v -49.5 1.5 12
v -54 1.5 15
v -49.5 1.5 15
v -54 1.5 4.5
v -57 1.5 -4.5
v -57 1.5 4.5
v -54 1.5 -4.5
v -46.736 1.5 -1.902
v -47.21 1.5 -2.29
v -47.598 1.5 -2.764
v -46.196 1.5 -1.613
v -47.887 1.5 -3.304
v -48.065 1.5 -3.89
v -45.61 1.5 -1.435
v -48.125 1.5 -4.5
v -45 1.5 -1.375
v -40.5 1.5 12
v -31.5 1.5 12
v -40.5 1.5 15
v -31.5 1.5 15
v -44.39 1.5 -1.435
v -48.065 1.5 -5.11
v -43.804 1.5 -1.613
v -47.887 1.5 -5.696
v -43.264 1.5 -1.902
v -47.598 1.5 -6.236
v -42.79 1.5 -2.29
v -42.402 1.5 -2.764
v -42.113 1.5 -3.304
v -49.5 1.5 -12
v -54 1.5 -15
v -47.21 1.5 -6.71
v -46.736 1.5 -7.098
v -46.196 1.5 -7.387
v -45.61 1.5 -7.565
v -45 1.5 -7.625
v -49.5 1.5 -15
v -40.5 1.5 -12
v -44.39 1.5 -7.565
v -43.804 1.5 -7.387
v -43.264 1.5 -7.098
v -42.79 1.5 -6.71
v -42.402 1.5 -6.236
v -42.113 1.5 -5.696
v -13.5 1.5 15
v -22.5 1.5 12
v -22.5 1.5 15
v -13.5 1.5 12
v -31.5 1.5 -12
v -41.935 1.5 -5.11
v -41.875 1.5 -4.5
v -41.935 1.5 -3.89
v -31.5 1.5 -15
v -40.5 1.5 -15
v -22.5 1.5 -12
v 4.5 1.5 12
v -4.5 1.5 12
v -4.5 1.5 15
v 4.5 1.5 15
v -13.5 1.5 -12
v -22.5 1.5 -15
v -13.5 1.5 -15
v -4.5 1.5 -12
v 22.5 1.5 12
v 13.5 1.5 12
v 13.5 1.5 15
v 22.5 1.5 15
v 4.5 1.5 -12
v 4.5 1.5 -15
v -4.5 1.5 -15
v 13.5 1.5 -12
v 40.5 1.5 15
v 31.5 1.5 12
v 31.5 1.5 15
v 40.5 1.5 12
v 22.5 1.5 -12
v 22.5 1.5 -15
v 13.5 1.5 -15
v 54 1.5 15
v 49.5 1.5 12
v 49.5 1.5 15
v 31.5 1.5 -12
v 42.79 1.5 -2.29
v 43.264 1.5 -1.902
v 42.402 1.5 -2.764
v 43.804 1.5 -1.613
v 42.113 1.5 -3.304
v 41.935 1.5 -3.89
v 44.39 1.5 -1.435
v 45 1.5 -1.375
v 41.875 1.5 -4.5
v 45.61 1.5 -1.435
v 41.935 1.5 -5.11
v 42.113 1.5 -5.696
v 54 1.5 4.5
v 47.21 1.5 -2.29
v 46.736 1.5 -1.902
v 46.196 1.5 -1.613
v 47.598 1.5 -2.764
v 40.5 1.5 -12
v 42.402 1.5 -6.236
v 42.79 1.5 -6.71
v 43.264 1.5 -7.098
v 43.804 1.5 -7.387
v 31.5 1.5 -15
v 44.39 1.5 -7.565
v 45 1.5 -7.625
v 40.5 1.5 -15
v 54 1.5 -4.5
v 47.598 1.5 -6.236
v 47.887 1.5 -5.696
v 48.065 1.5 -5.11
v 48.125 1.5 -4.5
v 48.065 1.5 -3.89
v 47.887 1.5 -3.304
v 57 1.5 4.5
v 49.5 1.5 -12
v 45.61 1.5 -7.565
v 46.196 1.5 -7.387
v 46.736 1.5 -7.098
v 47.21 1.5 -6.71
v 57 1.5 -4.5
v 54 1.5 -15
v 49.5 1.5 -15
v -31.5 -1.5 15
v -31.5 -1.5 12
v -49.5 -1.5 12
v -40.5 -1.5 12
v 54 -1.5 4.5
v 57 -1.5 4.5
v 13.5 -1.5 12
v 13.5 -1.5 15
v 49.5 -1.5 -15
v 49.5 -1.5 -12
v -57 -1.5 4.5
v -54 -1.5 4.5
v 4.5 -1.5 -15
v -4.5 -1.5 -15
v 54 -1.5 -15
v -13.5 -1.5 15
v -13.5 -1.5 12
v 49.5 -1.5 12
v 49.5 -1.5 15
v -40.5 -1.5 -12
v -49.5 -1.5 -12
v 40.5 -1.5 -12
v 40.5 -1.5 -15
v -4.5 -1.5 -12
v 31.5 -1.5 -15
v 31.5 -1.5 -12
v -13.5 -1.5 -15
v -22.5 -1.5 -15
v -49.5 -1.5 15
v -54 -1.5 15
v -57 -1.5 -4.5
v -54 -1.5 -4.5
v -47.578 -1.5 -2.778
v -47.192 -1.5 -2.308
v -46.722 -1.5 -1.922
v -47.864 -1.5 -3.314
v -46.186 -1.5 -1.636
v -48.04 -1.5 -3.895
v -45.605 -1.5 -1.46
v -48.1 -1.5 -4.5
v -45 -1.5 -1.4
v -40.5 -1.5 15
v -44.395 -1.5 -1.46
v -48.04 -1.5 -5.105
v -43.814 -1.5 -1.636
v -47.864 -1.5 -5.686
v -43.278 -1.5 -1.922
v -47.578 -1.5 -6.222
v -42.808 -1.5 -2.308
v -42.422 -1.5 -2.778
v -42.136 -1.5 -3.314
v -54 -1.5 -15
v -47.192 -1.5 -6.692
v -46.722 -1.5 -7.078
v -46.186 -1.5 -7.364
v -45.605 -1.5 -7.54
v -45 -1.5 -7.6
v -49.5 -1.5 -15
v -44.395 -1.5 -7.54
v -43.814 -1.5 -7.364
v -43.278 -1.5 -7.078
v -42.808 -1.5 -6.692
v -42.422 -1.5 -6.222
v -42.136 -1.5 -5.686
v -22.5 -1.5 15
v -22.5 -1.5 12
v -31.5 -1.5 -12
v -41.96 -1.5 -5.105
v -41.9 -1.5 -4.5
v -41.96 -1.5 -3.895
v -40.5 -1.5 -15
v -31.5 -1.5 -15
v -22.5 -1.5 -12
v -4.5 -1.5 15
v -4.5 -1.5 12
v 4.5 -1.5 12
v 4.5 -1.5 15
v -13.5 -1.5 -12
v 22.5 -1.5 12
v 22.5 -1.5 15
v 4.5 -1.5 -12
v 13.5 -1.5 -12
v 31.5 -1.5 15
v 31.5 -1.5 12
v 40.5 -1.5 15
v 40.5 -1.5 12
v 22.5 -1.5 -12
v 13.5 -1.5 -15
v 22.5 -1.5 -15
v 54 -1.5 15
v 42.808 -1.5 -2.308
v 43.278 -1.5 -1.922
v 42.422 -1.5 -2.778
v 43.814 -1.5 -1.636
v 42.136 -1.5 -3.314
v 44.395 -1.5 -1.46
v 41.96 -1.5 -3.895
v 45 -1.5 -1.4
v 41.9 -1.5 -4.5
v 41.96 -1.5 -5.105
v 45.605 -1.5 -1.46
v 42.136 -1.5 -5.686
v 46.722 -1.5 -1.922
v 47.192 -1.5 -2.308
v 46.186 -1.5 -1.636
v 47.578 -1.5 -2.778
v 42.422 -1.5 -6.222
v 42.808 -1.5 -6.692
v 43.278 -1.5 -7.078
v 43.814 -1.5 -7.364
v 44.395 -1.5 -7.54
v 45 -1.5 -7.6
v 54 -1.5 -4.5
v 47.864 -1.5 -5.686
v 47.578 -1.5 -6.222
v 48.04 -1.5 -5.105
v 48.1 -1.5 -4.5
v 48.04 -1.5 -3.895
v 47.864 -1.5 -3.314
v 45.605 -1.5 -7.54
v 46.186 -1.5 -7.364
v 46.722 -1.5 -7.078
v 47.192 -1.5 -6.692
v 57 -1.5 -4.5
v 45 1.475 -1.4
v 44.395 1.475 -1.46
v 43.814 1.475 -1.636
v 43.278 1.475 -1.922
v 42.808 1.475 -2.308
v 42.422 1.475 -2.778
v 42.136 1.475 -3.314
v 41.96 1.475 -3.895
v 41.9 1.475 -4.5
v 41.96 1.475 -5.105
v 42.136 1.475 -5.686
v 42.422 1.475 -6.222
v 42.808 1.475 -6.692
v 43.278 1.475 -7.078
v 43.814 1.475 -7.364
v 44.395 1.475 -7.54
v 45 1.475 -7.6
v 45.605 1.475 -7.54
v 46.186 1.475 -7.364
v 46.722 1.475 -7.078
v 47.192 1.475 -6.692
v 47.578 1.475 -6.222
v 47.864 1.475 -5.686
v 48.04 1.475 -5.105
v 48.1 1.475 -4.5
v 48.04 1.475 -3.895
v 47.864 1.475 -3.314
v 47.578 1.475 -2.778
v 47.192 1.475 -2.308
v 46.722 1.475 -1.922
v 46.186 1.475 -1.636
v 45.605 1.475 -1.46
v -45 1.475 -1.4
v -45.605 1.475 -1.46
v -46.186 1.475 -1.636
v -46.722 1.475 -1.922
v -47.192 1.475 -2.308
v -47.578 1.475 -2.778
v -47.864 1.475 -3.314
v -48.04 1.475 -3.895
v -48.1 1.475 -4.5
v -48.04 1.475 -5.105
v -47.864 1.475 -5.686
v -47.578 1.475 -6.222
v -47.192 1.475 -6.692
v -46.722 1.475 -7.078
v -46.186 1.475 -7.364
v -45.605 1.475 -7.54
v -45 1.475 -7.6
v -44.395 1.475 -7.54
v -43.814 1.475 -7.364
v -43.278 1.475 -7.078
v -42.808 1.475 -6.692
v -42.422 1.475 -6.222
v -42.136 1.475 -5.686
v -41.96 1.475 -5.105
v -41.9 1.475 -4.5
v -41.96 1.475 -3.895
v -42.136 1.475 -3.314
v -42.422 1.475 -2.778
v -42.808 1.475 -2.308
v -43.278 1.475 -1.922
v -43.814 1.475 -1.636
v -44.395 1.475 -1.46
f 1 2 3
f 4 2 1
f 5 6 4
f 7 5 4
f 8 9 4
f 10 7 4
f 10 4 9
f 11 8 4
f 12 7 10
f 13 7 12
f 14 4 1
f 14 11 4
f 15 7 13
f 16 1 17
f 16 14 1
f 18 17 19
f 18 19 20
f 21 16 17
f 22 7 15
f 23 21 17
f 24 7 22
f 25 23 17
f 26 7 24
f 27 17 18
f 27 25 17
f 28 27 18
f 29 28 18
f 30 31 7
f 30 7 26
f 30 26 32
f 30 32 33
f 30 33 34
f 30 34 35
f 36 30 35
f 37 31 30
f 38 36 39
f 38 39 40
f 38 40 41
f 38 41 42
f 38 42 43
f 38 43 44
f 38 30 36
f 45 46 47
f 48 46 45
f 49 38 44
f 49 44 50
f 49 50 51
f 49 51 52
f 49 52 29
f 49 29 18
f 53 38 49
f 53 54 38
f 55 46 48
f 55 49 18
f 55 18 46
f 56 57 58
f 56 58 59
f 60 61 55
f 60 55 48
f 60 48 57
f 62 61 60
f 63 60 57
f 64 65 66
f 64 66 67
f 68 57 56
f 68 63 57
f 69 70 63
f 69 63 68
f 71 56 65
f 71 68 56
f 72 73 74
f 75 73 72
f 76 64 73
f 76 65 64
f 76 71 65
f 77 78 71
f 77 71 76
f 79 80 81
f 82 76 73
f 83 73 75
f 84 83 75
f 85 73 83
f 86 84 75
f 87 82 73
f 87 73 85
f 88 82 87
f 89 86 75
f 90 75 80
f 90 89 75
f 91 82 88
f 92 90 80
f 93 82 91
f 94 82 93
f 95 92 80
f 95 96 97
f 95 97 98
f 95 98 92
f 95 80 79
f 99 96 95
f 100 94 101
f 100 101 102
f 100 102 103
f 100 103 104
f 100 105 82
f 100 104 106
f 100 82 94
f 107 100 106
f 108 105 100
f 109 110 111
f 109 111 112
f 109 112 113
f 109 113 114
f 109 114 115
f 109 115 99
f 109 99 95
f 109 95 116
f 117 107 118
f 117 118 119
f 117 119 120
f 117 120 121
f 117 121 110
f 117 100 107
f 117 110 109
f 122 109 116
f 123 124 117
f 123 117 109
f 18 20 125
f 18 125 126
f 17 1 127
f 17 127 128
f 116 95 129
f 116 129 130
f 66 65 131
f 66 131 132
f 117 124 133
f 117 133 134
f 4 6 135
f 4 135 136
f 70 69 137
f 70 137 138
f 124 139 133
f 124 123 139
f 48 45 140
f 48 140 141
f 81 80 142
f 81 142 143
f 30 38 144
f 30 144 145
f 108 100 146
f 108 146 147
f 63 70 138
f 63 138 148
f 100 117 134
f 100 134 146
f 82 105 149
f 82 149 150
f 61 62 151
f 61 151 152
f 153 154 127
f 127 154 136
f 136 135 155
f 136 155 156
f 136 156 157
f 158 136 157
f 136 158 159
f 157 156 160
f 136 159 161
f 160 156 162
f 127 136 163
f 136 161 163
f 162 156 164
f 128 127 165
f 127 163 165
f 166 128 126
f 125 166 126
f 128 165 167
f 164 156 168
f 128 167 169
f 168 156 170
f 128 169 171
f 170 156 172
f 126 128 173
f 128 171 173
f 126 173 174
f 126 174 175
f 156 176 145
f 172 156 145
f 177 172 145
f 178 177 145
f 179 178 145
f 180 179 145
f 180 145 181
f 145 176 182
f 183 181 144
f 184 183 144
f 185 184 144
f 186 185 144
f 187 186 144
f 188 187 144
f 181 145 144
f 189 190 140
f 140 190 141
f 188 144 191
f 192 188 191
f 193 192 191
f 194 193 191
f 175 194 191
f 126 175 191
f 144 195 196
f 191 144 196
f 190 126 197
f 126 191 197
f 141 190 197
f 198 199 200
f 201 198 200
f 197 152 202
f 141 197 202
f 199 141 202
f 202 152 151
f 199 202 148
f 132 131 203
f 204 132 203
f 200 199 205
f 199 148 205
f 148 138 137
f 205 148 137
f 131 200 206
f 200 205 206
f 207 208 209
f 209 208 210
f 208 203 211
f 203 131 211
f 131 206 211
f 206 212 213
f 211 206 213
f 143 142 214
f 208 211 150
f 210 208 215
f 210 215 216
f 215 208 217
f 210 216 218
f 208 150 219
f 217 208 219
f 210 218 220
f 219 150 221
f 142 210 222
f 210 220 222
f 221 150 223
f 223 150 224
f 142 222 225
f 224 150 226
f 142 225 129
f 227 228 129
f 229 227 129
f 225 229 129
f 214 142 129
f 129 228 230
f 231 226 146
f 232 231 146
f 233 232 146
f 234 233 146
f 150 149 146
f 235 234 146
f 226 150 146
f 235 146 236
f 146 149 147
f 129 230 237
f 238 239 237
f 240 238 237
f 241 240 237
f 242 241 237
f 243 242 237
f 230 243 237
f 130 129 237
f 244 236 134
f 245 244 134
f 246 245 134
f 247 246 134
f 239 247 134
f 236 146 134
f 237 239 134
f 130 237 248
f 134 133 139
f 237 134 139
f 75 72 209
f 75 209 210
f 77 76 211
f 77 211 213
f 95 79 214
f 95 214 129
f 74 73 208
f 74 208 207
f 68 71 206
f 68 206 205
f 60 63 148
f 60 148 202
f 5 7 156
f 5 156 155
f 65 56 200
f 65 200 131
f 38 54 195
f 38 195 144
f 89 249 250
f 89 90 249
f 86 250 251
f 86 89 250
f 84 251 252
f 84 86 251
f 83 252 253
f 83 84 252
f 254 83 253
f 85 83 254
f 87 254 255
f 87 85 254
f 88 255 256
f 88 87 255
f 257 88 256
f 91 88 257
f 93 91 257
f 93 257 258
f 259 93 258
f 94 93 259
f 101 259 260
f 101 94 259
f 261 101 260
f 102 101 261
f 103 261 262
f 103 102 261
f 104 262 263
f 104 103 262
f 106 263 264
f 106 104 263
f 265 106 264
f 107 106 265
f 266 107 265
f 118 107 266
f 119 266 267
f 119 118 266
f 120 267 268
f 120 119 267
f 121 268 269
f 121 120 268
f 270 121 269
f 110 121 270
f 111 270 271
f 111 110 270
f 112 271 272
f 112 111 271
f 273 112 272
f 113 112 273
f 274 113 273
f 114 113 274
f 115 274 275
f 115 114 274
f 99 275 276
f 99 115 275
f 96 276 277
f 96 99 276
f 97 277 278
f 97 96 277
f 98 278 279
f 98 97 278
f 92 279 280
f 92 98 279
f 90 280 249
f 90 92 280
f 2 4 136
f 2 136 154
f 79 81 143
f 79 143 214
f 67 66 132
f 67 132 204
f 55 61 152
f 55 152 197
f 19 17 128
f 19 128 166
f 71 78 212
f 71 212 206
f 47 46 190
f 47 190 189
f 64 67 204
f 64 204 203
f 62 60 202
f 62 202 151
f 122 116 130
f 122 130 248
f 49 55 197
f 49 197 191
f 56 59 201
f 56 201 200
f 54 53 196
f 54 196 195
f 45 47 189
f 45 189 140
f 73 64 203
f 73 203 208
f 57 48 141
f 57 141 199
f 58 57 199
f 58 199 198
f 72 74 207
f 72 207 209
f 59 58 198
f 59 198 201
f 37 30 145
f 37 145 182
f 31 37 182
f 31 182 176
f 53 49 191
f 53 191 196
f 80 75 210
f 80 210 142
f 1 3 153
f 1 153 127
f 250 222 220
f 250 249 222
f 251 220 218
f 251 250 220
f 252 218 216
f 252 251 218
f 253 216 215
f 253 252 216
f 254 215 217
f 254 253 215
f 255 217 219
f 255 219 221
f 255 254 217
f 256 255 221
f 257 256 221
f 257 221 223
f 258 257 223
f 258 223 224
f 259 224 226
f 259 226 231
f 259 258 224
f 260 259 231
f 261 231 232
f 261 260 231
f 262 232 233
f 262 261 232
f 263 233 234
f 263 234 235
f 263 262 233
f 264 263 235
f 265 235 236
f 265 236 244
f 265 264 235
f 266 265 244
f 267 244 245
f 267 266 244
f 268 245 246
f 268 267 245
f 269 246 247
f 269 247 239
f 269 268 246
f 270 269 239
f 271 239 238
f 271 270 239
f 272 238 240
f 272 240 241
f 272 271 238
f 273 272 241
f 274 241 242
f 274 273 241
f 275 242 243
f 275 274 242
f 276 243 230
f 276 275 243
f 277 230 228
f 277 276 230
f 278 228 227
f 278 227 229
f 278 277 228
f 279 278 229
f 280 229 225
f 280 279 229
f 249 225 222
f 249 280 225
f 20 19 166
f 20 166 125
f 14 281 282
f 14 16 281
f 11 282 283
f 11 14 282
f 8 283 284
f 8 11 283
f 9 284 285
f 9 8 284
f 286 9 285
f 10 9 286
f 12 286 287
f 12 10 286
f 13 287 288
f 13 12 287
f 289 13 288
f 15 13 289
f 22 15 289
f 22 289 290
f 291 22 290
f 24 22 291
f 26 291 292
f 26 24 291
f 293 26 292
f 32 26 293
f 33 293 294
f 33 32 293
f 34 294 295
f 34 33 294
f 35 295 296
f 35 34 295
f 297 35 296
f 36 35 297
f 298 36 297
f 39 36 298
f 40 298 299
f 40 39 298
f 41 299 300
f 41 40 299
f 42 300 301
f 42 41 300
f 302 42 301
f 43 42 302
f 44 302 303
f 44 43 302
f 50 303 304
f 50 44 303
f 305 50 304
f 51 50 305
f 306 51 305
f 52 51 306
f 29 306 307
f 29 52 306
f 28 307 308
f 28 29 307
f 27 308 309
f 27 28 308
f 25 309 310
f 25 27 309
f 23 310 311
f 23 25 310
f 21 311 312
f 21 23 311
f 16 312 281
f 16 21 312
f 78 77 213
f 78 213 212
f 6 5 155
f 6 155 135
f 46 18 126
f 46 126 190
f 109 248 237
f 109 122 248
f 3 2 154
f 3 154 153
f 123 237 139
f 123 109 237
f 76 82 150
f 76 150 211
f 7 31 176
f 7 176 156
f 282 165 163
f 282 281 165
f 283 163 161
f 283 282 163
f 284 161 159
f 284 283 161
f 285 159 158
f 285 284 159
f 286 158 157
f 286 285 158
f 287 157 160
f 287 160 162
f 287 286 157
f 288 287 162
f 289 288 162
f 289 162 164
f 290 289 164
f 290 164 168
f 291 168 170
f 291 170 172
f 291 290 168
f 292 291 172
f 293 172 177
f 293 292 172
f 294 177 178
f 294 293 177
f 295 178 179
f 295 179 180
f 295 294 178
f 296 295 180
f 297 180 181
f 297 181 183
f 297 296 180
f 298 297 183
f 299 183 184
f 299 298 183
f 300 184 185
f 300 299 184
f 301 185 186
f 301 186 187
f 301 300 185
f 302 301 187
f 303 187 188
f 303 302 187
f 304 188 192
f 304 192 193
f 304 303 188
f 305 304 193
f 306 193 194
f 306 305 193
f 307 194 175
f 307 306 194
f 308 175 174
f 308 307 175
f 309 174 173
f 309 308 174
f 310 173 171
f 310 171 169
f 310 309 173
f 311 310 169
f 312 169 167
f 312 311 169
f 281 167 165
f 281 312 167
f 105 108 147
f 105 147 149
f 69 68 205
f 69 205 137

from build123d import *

# Parameters (mm, degrees)
BOSS_EXTRUDE1_DEPTH                 = 1.5
F_6_2_6_2_DIAMETER_HOLE1_AT_2_COUNT = 2
F_6_2_6_2_DIAMETER_HOLE1_AT_2_PITCH = 90


with BuildPart() as part:
    # Sketch1 → Boss-Extrude1 (new, symmetric)
    with BuildSketch(Plane(origin=(0, 0, 0), x_dir=(1, 0, 0), z_dir=(0, 1, 0))):
        Polygon((54, 15), (49.5, 15), (49.5, 12), (40.5, 12), (40.5, 15), (31.5, 15), (31.5, 12), (22.5, 12), (22.5, 15), (13.5, 15), (13.5, 12), (4.5, 12), (4.5, 15), (-4.5, 15), (-4.5, 12), (-13.5, 12), (-13.5, 15), (-22.5, 15), (-22.5, 12), (-31.5, 12), (-31.5, 15), (-40.5, 15), (-40.5, 12), (-49.5, 12), (-49.5, 15), (-54, 15), (-54, 12), (-54, 4.5), (-57, 4.5), (-57, -4.5), (-54, -4.5), (-54, -12), (-54, -15), (-49.5, -15), (-49.5, -12), (-40.5, -12), (-40.5, -15), (-31.5, -15), (-31.5, -12), (-22.5, -12), (-22.5, -15), (-13.5, -15), (-13.5, -12), (-4.5, -12), (-4.5, -15), (4.5, -15), (4.5, -12), (13.5, -12), (13.5, -15), (22.5, -15), (22.5, -12), (31.5, -12), (31.5, -15), (40.5, -15), (40.5, -12), (49.5, -12), (49.5, -15), (54, -15), (54, -12), (54, -4.5), (57, -4.5), (57, 4.5), (54, 4.5), (54, 12), align=None)
    extrude(amount=BOSS_EXTRUDE1_DEPTH, both=True)

    # Sketch4 → Ø6.2 (6.2) Diameter Hole1 (revolve, cut)
    with BuildSketch(Plane(origin=(-45, 1.5, -4.5), x_dir=(0, 0, 1), z_dir=(1, 0, 0))):
        Polygon((0, 0), (0, 3), (3.1, 3), (3.1, 0.025), (3.125, 0), align=None)
    f_6_2_6_2_diameter_hole1 = revolve(axis=Axis((-45, 7.85, -4.5), (0, -1, 0)), mode=Mode.SUBTRACT)

    # Ø6.2 (6.2) Diameter Hole1 at 2: Ø6.2 (6.2) Diameter Hole1 ×2
    with Locations(*[(i * F_6_2_6_2_DIAMETER_HOLE1_AT_2_PITCH, 0, 0) for i in range(1, F_6_2_6_2_DIAMETER_HOLE1_AT_2_COUNT)]):
        add(f_6_2_6_2_diameter_hole1, mode=Mode.SUBTRACT)


solid = part.part
